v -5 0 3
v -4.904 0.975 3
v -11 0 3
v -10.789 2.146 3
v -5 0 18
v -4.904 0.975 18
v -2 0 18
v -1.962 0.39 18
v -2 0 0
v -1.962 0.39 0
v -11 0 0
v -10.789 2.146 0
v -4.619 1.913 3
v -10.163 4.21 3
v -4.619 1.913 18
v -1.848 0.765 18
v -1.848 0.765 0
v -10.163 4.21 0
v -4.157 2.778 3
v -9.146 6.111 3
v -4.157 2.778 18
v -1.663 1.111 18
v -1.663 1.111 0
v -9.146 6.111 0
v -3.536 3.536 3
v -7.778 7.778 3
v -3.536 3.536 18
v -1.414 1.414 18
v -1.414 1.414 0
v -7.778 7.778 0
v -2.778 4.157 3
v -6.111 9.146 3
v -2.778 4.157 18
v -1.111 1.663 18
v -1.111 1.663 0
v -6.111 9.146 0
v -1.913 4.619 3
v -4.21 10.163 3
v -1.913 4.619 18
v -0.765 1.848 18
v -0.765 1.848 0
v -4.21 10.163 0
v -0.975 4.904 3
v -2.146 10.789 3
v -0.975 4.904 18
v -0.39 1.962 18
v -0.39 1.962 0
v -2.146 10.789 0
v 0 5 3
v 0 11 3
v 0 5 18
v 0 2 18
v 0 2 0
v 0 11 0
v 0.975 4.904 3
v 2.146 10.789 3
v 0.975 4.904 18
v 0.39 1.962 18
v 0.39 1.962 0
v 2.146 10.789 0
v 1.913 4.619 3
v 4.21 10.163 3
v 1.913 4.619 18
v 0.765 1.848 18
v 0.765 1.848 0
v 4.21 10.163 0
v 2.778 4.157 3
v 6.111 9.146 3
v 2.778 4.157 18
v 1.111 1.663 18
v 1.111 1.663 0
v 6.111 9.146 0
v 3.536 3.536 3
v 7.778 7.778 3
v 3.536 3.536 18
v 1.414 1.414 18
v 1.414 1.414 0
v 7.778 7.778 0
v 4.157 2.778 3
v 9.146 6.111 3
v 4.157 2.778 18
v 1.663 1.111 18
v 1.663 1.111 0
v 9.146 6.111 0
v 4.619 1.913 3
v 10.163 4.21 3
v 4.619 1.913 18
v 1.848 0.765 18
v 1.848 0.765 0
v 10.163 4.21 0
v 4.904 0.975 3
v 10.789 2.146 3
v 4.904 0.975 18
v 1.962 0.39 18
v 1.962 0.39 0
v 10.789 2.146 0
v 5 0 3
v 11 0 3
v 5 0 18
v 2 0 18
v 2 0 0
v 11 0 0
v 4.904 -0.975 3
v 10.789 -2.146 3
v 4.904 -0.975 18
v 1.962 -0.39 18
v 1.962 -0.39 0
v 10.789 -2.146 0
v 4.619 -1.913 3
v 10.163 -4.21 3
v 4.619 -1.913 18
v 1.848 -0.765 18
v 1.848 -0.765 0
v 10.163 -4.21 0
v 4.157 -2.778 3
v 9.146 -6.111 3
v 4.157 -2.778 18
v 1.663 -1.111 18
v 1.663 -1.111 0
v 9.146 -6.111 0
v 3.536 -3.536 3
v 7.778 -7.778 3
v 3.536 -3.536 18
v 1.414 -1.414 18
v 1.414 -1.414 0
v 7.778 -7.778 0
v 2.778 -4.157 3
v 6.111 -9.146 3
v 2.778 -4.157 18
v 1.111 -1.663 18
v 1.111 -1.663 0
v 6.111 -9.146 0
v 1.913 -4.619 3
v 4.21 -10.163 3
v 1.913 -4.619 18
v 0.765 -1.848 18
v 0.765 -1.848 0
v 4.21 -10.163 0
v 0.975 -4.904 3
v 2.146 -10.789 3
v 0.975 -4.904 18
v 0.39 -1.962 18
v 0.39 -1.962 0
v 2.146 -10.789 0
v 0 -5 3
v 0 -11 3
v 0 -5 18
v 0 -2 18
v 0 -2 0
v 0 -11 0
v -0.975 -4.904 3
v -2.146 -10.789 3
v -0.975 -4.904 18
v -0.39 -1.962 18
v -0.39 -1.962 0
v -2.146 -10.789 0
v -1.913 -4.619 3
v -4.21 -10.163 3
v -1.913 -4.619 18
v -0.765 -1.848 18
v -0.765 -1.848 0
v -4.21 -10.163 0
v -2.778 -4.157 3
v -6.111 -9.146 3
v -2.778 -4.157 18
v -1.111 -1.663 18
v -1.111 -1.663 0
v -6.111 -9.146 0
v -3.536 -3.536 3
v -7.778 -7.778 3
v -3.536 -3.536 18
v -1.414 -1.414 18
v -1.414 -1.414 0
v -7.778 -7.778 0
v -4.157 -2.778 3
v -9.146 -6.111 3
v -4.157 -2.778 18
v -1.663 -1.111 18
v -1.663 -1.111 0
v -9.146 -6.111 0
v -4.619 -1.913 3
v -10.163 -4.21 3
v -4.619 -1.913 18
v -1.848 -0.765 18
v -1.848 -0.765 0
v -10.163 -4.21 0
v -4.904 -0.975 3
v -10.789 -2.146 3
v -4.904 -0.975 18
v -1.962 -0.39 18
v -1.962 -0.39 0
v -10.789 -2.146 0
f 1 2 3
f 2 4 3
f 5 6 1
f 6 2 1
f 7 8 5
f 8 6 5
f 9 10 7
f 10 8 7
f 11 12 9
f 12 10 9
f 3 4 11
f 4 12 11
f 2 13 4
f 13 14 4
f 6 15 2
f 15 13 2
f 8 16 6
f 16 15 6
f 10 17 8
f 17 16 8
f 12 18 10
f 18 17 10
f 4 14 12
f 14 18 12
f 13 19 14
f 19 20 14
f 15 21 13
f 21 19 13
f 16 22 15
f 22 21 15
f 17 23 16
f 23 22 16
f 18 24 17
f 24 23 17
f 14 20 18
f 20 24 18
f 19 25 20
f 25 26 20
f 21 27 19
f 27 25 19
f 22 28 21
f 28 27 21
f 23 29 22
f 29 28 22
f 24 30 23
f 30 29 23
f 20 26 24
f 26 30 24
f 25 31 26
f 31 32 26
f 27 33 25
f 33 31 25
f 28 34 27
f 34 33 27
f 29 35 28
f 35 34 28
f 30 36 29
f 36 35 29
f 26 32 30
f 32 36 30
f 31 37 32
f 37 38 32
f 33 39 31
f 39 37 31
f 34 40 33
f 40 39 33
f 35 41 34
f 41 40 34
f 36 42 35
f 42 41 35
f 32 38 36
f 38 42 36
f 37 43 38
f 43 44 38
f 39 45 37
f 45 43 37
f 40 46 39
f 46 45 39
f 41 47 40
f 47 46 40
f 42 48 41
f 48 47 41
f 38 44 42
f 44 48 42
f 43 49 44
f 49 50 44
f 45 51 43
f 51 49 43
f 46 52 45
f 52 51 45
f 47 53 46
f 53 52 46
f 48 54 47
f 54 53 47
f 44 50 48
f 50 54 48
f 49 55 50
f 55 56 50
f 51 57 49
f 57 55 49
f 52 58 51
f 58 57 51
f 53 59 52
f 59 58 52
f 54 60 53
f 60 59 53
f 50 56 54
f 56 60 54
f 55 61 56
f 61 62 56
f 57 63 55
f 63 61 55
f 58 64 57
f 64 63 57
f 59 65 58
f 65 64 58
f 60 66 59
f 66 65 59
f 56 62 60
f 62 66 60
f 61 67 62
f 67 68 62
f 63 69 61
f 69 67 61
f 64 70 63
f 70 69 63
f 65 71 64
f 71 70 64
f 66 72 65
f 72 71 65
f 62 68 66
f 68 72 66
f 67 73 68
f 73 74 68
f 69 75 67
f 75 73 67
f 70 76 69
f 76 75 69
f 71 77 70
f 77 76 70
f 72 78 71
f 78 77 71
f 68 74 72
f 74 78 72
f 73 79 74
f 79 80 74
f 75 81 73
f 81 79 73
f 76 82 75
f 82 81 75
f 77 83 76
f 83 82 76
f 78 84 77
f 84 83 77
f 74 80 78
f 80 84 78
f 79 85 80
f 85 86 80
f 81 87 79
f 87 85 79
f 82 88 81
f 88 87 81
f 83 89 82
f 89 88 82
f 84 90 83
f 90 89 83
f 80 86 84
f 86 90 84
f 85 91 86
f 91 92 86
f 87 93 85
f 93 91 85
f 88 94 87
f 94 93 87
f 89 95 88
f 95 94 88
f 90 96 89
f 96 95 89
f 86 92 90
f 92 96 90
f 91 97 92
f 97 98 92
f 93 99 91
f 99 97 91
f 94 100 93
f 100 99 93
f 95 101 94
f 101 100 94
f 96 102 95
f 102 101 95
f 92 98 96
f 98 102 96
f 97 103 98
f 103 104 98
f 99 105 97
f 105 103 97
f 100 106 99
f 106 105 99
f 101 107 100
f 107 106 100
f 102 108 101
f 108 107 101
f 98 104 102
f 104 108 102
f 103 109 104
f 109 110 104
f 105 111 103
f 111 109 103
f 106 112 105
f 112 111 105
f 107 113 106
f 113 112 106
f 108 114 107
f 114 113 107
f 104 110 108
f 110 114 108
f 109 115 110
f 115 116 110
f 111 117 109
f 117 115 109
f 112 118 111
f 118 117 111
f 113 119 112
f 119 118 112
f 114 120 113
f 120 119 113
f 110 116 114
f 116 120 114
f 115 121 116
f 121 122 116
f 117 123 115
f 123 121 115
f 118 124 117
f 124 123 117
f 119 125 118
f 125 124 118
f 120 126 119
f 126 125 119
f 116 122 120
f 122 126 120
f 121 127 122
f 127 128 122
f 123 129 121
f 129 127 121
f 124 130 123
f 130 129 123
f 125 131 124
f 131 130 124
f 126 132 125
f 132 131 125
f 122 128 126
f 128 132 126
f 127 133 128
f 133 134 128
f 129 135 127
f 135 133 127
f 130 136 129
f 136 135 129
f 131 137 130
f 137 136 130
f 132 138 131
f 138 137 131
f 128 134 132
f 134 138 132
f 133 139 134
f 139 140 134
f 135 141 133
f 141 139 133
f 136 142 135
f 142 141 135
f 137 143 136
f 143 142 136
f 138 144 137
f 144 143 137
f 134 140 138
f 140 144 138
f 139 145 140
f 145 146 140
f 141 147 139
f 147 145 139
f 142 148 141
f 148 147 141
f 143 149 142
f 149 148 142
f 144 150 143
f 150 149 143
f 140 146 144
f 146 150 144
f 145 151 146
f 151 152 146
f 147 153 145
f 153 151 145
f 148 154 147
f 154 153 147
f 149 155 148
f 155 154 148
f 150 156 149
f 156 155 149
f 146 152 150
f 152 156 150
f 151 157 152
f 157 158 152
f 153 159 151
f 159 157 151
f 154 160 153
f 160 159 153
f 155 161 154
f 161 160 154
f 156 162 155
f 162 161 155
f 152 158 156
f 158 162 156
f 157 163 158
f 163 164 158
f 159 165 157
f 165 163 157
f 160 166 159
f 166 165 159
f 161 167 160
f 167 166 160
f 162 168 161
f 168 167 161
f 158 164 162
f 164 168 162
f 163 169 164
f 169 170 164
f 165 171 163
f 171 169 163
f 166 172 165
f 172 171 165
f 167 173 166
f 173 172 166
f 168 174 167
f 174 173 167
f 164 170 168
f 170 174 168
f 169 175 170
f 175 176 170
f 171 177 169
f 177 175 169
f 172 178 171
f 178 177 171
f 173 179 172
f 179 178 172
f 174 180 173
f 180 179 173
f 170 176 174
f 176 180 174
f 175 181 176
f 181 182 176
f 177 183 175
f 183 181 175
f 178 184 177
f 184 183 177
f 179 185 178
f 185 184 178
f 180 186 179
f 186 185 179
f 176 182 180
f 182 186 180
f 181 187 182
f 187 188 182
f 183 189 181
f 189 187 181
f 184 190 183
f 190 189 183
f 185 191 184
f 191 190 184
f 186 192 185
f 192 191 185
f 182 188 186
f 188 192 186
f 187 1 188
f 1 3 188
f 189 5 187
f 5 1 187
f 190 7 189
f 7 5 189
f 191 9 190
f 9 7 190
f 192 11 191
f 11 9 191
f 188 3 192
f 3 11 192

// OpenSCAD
$fn = 32;

// ----------------------------------------------------------------------
// Profiled standoff: flanged spacer, 18 mm long, bore 4 mm
// ----------------------------------------------------------------------

// --- parameters (mm) ---
revolve_angle = 360;      // full turn around the Z axis
profile_points = 6;       // points of the closed outline

profile = [[2, 0], [11, 0], [11, 3], [5, 3], [5, 18], [2, 18]];  // single closed polygon, 6 points, counter clockwise

// --- the one profile operation ---
rotate_extrude(angle = revolve_angle) polygon(points = profile);
